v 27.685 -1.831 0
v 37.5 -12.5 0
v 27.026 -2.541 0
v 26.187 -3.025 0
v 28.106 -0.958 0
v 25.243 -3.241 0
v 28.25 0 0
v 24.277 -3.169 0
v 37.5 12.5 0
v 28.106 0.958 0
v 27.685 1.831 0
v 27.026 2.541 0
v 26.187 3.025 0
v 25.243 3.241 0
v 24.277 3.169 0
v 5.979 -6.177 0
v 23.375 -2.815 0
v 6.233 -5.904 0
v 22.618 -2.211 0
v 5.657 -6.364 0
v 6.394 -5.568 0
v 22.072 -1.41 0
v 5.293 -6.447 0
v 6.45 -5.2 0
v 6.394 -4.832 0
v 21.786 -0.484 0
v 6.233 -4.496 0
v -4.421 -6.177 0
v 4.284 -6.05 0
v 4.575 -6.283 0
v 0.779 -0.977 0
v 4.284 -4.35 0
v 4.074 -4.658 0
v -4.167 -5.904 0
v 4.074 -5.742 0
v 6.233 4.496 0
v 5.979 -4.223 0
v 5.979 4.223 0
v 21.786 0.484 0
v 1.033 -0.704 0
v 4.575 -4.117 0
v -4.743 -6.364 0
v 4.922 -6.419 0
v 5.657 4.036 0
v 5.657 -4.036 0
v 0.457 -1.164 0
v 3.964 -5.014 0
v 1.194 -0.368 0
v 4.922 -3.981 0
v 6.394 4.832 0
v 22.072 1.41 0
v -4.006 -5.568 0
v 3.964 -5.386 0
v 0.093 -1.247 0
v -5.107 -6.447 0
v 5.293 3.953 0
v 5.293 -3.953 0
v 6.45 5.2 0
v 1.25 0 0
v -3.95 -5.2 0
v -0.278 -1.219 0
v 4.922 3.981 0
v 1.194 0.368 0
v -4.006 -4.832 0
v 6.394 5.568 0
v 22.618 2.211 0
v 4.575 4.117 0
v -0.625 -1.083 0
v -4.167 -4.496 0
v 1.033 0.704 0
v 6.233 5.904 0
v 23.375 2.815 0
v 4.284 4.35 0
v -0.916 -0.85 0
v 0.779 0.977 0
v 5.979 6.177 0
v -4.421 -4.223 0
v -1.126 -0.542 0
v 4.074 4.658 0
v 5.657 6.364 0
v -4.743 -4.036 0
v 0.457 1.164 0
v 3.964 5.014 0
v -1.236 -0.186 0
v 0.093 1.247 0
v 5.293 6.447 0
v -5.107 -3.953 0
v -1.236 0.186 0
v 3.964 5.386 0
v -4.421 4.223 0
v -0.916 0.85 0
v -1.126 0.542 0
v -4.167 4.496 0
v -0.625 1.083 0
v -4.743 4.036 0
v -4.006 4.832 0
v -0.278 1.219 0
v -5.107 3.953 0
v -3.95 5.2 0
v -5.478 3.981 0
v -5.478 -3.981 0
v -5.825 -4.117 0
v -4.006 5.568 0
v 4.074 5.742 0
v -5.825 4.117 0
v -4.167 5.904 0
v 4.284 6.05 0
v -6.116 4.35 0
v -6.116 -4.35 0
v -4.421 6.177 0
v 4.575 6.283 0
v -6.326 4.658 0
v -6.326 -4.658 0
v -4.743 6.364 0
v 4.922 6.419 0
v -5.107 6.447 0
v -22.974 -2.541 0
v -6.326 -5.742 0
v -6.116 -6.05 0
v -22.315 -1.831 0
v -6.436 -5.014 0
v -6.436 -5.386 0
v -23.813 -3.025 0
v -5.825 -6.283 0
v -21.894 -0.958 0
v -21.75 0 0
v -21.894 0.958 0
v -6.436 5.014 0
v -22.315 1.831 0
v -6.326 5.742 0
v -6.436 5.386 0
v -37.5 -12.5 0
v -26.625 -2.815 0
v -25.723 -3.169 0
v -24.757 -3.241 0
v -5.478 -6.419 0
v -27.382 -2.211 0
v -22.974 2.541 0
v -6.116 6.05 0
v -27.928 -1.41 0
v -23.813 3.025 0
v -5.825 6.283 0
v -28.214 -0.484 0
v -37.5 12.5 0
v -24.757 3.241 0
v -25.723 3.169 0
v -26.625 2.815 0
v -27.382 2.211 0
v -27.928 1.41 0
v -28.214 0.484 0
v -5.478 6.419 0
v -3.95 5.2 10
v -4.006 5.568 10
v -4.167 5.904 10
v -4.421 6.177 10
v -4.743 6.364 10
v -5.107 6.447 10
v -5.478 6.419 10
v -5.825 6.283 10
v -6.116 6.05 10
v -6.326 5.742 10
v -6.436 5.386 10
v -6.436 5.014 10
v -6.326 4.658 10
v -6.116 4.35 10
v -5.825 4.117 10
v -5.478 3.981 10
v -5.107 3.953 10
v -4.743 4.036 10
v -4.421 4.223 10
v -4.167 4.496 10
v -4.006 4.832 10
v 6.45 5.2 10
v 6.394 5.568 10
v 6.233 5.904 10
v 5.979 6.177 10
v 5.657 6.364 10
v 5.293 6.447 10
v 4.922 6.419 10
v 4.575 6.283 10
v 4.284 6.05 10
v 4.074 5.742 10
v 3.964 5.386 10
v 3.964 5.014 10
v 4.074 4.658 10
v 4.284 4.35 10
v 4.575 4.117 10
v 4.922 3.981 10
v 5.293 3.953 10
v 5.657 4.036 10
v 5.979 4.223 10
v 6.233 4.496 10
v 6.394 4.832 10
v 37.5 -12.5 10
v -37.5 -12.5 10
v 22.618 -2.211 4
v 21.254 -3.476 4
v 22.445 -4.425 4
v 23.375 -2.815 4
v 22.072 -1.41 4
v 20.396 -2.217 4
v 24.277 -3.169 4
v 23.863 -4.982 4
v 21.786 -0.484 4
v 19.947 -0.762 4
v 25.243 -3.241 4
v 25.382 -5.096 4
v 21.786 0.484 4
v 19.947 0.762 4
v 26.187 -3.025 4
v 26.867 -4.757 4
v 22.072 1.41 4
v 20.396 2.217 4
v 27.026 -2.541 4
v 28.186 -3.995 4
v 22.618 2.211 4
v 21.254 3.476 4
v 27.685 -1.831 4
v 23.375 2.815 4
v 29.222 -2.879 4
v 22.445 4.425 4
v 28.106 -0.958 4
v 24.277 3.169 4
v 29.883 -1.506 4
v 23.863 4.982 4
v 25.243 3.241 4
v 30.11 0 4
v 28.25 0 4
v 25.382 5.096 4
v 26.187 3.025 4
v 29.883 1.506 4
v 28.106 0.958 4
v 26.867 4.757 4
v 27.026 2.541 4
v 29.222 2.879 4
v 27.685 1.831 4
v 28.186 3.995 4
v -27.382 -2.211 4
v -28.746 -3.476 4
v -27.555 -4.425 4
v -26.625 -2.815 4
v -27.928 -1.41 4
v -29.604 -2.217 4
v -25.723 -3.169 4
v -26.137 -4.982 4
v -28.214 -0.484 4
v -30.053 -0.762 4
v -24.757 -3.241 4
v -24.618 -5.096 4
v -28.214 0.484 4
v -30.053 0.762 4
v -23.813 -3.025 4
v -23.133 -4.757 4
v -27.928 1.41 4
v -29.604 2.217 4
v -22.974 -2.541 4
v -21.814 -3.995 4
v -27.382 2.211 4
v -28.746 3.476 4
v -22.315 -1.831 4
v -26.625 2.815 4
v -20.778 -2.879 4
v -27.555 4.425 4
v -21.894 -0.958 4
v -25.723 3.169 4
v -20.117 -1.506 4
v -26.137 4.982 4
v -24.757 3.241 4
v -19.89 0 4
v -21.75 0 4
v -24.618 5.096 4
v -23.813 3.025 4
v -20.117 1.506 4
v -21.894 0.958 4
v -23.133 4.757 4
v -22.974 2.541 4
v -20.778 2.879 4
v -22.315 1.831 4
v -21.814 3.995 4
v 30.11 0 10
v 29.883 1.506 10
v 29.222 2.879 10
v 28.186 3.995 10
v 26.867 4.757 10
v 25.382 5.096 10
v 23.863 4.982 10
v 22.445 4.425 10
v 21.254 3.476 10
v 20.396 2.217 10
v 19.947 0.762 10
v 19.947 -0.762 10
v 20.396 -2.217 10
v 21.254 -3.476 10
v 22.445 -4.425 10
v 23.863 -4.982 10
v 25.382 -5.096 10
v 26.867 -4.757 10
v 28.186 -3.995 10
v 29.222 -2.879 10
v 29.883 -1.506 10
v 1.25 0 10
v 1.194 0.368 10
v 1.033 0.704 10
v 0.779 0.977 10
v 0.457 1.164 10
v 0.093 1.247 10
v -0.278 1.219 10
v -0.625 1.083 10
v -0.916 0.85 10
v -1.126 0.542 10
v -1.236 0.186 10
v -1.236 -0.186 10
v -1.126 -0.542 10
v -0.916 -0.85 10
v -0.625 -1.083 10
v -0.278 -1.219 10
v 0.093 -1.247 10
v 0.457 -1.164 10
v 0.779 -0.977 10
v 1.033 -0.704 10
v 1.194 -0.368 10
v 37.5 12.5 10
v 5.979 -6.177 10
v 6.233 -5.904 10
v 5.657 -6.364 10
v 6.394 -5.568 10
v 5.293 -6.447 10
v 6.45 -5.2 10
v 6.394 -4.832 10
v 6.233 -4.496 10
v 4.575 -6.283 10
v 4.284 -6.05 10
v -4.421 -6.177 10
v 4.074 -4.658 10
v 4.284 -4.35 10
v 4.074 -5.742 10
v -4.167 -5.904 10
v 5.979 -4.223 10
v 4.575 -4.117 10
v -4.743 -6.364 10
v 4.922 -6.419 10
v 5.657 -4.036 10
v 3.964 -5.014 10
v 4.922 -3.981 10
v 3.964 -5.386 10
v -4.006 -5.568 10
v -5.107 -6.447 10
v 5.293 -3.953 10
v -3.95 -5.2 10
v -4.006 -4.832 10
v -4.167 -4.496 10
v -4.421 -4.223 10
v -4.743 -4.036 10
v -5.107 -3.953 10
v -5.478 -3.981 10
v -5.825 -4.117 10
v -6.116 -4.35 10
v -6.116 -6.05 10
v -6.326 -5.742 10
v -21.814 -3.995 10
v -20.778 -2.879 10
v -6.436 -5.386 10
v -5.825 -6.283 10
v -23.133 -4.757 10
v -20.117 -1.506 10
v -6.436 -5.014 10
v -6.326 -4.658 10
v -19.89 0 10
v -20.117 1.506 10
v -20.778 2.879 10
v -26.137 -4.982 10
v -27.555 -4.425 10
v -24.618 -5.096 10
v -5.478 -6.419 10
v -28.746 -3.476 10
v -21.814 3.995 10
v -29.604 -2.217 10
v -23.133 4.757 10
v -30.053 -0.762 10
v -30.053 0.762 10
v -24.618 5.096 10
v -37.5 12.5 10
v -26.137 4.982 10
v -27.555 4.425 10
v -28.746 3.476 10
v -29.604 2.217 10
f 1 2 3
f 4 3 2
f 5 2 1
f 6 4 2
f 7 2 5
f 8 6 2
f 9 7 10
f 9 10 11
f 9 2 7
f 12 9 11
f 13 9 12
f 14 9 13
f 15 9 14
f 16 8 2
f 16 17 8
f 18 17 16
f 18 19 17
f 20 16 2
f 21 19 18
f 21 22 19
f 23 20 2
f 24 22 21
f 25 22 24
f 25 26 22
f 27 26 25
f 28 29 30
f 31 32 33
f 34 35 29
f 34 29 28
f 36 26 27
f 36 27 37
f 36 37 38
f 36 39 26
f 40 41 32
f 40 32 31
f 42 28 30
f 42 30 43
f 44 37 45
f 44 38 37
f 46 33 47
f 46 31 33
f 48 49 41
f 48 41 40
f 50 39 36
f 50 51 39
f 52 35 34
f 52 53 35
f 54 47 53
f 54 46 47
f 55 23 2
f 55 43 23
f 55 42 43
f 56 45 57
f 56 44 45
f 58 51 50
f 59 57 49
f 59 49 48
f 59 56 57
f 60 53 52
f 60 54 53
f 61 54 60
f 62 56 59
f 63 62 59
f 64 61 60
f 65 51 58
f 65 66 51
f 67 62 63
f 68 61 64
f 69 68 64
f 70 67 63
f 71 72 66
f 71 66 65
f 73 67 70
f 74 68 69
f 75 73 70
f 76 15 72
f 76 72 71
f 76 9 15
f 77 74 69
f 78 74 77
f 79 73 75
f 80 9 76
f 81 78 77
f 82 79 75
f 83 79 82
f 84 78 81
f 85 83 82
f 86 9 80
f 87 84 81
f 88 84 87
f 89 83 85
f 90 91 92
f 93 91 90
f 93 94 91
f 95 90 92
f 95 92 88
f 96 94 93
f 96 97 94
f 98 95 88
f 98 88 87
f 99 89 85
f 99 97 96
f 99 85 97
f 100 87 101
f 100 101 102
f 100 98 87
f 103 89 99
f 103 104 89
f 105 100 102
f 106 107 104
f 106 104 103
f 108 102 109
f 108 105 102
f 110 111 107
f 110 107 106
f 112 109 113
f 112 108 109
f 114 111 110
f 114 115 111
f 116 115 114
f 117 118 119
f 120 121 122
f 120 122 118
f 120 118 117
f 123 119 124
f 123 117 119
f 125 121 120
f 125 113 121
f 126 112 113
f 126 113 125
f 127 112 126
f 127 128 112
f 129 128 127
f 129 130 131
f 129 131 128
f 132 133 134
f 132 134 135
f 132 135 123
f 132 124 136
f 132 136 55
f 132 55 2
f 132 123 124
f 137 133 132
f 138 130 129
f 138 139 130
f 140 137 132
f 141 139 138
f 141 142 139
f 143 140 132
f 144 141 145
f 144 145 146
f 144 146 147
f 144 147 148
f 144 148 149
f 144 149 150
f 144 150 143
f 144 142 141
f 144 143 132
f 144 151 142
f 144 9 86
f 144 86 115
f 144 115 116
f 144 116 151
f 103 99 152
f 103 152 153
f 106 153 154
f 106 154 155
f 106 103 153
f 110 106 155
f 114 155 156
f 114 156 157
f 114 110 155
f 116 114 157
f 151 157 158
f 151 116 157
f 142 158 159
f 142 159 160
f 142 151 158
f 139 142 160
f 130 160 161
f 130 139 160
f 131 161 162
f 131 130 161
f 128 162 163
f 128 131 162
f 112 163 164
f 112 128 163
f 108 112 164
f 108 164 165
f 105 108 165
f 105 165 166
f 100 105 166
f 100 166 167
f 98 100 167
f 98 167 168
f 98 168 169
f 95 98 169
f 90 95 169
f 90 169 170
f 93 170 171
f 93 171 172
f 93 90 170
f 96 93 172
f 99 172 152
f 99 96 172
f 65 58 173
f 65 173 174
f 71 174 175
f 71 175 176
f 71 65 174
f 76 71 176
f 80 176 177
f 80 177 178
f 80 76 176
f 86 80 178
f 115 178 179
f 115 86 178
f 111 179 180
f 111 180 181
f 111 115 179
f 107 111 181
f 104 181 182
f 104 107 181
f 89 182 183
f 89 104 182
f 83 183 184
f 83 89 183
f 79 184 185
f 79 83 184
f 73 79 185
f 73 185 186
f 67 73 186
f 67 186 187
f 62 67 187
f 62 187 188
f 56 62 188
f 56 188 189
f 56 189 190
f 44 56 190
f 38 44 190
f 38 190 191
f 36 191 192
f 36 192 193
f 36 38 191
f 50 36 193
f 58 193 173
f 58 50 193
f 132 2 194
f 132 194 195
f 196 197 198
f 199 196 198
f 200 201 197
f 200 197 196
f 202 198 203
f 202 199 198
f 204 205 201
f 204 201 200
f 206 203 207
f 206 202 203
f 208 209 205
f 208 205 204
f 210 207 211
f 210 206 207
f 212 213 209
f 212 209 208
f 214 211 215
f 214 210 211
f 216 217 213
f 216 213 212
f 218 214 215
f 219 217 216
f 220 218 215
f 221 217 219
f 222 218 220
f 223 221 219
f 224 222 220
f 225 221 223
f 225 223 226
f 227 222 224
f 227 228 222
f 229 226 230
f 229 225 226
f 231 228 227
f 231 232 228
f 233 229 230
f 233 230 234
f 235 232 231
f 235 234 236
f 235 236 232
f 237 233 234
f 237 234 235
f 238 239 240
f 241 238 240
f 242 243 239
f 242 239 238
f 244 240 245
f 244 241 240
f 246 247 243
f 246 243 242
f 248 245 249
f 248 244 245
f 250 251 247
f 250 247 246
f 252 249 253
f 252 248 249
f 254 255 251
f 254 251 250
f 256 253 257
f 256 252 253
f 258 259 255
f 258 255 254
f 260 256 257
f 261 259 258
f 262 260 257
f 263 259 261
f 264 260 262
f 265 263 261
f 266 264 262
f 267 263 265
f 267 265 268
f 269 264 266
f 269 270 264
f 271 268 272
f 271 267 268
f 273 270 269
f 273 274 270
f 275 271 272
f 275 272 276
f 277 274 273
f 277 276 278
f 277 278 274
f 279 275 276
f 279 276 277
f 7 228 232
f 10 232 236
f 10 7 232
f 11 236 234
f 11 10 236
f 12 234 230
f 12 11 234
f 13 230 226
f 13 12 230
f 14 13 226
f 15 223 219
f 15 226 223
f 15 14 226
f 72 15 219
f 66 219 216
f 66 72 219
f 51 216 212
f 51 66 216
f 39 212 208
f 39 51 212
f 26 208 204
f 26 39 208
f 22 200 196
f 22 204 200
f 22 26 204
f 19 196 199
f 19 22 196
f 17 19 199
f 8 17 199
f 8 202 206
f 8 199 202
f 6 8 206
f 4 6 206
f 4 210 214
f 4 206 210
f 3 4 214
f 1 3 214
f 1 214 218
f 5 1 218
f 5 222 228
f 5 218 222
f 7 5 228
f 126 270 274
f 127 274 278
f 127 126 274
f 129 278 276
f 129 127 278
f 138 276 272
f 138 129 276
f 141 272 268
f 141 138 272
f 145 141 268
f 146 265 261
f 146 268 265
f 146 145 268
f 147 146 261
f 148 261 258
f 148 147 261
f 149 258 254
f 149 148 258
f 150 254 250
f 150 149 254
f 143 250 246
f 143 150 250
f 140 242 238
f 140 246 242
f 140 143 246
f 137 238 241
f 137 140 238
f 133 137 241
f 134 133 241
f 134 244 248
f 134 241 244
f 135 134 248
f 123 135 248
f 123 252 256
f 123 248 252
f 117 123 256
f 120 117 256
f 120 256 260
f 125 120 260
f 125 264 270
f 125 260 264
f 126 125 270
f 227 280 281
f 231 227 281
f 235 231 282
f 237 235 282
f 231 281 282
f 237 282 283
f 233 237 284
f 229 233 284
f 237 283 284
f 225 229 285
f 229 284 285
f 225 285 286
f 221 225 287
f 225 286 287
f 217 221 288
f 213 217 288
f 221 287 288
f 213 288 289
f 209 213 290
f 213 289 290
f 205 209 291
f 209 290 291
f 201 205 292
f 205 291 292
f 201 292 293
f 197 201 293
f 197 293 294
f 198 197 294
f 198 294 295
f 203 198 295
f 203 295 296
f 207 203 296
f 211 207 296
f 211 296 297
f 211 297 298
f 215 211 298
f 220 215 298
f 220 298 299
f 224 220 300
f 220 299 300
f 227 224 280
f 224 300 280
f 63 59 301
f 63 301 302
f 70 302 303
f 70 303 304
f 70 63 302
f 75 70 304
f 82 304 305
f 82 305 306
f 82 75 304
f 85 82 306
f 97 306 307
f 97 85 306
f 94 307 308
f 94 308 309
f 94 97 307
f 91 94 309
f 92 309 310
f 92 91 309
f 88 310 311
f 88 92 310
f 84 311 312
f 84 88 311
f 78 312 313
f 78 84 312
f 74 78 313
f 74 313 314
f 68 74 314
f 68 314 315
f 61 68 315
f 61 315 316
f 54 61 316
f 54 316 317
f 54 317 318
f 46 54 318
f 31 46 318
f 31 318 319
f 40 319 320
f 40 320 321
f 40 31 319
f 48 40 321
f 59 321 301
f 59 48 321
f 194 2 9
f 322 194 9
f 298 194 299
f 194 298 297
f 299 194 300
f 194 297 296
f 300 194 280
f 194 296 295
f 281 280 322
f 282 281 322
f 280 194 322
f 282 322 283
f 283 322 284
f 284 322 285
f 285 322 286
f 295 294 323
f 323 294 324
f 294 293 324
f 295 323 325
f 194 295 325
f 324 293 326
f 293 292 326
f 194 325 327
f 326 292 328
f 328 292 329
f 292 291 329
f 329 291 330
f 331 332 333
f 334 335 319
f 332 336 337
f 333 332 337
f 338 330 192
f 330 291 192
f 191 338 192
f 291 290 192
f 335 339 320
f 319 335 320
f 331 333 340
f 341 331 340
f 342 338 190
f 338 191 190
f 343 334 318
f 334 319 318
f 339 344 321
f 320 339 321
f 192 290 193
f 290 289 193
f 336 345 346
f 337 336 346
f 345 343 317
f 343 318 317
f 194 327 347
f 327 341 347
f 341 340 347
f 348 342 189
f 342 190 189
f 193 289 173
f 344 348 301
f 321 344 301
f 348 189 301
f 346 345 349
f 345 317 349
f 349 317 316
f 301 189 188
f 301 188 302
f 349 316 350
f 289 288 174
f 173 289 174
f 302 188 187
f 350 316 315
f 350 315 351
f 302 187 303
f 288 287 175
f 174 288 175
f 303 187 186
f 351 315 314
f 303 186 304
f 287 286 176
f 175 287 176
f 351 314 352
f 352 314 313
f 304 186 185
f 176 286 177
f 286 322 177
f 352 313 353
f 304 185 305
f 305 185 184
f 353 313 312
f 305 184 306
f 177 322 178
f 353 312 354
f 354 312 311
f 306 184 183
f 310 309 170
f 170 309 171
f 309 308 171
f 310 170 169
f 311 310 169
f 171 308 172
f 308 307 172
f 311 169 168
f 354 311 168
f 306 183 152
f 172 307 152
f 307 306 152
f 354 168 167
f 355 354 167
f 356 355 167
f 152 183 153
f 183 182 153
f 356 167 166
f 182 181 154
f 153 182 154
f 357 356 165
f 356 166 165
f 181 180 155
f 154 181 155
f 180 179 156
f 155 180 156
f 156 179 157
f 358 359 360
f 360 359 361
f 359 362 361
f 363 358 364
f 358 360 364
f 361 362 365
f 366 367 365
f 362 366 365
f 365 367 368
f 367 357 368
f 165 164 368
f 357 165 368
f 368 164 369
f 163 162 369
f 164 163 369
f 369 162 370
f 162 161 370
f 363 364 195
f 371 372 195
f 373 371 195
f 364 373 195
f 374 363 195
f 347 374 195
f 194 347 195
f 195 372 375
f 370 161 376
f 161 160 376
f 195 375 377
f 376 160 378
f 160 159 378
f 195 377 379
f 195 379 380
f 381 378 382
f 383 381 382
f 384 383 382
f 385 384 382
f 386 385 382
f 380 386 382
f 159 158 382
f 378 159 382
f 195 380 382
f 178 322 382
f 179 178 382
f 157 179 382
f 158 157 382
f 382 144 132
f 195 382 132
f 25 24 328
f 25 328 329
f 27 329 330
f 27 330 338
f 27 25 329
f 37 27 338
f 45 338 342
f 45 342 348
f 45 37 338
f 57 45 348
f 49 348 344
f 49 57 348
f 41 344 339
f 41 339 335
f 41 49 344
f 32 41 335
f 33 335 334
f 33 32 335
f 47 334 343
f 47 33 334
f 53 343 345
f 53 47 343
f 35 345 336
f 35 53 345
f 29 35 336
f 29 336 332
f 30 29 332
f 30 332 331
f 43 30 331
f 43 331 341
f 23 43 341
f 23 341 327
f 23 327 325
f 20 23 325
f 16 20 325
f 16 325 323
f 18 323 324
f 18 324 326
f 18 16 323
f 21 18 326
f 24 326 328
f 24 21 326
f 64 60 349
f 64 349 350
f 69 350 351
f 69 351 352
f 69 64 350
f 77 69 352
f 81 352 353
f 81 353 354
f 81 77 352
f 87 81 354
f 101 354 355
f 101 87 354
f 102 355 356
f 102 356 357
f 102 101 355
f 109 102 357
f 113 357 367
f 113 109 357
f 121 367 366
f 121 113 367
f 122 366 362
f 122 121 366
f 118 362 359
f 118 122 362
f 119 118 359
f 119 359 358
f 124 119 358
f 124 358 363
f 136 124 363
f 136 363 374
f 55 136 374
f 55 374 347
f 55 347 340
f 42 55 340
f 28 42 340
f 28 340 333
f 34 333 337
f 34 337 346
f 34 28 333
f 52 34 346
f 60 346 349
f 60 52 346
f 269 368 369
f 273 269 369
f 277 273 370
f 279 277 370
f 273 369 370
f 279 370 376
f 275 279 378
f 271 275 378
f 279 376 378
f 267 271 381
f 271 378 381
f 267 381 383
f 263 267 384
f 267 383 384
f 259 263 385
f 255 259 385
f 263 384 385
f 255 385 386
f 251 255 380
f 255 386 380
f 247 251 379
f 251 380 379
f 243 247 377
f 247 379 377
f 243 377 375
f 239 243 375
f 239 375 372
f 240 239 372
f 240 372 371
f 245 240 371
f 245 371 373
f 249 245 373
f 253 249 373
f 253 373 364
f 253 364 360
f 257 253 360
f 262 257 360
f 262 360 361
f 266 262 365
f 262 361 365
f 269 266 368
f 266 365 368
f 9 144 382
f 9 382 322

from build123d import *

# Parameters (mm, degrees)
SKETCH1_R           = 3.25
SKETCH1_R_2         = 1.25
BOSS_EXTRUDE1_DEPTH = 10
SKETCH2_R           = 5.11
CUT_EXTRUDE1_DEPTH  = 6


with BuildPart() as part:
    # Sketch1 → Boss-Extrude1 (new body)
    with BuildSketch(Plane.XY):
        Polygon((-37.5, 12.5), (37.5, 12.5), (37.5, 0), (37.5, -12.5), (-37.5, -12.5), (-37.5, 0), align=None)
        with Locations((-25, 0)):
            Circle(SKETCH1_R, mode=Mode.SUBTRACT)
        with Locations((25, 0)):
            Circle(SKETCH1_R, mode=Mode.SUBTRACT)
        Circle(SKETCH1_R_2, mode=Mode.SUBTRACT)
        with Locations((-5.2, 5.2)):
            Circle(SKETCH1_R_2, mode=Mode.SUBTRACT)
        with Locations((5.2, 5.2)):
            Circle(SKETCH1_R_2, mode=Mode.SUBTRACT)
        with Locations((5.2, -5.2)):
            Circle(SKETCH1_R_2, mode=Mode.SUBTRACT)
        with Locations((-5.2, -5.2)):
            Circle(SKETCH1_R_2, mode=Mode.SUBTRACT)
    extrude(amount=BOSS_EXTRUDE1_DEPTH)

    # Sketch2 → Cut-Extrude1 (cut)
    with BuildSketch(Plane.XY.offset(10)):
        with Locations((-25, 0)):
            Circle(SKETCH2_R)
        with Locations((25, 0)):
            Circle(SKETCH2_R)
    extrude(amount=-CUT_EXTRUDE1_DEPTH, mode=Mode.SUBTRACT)


solid = part.part
